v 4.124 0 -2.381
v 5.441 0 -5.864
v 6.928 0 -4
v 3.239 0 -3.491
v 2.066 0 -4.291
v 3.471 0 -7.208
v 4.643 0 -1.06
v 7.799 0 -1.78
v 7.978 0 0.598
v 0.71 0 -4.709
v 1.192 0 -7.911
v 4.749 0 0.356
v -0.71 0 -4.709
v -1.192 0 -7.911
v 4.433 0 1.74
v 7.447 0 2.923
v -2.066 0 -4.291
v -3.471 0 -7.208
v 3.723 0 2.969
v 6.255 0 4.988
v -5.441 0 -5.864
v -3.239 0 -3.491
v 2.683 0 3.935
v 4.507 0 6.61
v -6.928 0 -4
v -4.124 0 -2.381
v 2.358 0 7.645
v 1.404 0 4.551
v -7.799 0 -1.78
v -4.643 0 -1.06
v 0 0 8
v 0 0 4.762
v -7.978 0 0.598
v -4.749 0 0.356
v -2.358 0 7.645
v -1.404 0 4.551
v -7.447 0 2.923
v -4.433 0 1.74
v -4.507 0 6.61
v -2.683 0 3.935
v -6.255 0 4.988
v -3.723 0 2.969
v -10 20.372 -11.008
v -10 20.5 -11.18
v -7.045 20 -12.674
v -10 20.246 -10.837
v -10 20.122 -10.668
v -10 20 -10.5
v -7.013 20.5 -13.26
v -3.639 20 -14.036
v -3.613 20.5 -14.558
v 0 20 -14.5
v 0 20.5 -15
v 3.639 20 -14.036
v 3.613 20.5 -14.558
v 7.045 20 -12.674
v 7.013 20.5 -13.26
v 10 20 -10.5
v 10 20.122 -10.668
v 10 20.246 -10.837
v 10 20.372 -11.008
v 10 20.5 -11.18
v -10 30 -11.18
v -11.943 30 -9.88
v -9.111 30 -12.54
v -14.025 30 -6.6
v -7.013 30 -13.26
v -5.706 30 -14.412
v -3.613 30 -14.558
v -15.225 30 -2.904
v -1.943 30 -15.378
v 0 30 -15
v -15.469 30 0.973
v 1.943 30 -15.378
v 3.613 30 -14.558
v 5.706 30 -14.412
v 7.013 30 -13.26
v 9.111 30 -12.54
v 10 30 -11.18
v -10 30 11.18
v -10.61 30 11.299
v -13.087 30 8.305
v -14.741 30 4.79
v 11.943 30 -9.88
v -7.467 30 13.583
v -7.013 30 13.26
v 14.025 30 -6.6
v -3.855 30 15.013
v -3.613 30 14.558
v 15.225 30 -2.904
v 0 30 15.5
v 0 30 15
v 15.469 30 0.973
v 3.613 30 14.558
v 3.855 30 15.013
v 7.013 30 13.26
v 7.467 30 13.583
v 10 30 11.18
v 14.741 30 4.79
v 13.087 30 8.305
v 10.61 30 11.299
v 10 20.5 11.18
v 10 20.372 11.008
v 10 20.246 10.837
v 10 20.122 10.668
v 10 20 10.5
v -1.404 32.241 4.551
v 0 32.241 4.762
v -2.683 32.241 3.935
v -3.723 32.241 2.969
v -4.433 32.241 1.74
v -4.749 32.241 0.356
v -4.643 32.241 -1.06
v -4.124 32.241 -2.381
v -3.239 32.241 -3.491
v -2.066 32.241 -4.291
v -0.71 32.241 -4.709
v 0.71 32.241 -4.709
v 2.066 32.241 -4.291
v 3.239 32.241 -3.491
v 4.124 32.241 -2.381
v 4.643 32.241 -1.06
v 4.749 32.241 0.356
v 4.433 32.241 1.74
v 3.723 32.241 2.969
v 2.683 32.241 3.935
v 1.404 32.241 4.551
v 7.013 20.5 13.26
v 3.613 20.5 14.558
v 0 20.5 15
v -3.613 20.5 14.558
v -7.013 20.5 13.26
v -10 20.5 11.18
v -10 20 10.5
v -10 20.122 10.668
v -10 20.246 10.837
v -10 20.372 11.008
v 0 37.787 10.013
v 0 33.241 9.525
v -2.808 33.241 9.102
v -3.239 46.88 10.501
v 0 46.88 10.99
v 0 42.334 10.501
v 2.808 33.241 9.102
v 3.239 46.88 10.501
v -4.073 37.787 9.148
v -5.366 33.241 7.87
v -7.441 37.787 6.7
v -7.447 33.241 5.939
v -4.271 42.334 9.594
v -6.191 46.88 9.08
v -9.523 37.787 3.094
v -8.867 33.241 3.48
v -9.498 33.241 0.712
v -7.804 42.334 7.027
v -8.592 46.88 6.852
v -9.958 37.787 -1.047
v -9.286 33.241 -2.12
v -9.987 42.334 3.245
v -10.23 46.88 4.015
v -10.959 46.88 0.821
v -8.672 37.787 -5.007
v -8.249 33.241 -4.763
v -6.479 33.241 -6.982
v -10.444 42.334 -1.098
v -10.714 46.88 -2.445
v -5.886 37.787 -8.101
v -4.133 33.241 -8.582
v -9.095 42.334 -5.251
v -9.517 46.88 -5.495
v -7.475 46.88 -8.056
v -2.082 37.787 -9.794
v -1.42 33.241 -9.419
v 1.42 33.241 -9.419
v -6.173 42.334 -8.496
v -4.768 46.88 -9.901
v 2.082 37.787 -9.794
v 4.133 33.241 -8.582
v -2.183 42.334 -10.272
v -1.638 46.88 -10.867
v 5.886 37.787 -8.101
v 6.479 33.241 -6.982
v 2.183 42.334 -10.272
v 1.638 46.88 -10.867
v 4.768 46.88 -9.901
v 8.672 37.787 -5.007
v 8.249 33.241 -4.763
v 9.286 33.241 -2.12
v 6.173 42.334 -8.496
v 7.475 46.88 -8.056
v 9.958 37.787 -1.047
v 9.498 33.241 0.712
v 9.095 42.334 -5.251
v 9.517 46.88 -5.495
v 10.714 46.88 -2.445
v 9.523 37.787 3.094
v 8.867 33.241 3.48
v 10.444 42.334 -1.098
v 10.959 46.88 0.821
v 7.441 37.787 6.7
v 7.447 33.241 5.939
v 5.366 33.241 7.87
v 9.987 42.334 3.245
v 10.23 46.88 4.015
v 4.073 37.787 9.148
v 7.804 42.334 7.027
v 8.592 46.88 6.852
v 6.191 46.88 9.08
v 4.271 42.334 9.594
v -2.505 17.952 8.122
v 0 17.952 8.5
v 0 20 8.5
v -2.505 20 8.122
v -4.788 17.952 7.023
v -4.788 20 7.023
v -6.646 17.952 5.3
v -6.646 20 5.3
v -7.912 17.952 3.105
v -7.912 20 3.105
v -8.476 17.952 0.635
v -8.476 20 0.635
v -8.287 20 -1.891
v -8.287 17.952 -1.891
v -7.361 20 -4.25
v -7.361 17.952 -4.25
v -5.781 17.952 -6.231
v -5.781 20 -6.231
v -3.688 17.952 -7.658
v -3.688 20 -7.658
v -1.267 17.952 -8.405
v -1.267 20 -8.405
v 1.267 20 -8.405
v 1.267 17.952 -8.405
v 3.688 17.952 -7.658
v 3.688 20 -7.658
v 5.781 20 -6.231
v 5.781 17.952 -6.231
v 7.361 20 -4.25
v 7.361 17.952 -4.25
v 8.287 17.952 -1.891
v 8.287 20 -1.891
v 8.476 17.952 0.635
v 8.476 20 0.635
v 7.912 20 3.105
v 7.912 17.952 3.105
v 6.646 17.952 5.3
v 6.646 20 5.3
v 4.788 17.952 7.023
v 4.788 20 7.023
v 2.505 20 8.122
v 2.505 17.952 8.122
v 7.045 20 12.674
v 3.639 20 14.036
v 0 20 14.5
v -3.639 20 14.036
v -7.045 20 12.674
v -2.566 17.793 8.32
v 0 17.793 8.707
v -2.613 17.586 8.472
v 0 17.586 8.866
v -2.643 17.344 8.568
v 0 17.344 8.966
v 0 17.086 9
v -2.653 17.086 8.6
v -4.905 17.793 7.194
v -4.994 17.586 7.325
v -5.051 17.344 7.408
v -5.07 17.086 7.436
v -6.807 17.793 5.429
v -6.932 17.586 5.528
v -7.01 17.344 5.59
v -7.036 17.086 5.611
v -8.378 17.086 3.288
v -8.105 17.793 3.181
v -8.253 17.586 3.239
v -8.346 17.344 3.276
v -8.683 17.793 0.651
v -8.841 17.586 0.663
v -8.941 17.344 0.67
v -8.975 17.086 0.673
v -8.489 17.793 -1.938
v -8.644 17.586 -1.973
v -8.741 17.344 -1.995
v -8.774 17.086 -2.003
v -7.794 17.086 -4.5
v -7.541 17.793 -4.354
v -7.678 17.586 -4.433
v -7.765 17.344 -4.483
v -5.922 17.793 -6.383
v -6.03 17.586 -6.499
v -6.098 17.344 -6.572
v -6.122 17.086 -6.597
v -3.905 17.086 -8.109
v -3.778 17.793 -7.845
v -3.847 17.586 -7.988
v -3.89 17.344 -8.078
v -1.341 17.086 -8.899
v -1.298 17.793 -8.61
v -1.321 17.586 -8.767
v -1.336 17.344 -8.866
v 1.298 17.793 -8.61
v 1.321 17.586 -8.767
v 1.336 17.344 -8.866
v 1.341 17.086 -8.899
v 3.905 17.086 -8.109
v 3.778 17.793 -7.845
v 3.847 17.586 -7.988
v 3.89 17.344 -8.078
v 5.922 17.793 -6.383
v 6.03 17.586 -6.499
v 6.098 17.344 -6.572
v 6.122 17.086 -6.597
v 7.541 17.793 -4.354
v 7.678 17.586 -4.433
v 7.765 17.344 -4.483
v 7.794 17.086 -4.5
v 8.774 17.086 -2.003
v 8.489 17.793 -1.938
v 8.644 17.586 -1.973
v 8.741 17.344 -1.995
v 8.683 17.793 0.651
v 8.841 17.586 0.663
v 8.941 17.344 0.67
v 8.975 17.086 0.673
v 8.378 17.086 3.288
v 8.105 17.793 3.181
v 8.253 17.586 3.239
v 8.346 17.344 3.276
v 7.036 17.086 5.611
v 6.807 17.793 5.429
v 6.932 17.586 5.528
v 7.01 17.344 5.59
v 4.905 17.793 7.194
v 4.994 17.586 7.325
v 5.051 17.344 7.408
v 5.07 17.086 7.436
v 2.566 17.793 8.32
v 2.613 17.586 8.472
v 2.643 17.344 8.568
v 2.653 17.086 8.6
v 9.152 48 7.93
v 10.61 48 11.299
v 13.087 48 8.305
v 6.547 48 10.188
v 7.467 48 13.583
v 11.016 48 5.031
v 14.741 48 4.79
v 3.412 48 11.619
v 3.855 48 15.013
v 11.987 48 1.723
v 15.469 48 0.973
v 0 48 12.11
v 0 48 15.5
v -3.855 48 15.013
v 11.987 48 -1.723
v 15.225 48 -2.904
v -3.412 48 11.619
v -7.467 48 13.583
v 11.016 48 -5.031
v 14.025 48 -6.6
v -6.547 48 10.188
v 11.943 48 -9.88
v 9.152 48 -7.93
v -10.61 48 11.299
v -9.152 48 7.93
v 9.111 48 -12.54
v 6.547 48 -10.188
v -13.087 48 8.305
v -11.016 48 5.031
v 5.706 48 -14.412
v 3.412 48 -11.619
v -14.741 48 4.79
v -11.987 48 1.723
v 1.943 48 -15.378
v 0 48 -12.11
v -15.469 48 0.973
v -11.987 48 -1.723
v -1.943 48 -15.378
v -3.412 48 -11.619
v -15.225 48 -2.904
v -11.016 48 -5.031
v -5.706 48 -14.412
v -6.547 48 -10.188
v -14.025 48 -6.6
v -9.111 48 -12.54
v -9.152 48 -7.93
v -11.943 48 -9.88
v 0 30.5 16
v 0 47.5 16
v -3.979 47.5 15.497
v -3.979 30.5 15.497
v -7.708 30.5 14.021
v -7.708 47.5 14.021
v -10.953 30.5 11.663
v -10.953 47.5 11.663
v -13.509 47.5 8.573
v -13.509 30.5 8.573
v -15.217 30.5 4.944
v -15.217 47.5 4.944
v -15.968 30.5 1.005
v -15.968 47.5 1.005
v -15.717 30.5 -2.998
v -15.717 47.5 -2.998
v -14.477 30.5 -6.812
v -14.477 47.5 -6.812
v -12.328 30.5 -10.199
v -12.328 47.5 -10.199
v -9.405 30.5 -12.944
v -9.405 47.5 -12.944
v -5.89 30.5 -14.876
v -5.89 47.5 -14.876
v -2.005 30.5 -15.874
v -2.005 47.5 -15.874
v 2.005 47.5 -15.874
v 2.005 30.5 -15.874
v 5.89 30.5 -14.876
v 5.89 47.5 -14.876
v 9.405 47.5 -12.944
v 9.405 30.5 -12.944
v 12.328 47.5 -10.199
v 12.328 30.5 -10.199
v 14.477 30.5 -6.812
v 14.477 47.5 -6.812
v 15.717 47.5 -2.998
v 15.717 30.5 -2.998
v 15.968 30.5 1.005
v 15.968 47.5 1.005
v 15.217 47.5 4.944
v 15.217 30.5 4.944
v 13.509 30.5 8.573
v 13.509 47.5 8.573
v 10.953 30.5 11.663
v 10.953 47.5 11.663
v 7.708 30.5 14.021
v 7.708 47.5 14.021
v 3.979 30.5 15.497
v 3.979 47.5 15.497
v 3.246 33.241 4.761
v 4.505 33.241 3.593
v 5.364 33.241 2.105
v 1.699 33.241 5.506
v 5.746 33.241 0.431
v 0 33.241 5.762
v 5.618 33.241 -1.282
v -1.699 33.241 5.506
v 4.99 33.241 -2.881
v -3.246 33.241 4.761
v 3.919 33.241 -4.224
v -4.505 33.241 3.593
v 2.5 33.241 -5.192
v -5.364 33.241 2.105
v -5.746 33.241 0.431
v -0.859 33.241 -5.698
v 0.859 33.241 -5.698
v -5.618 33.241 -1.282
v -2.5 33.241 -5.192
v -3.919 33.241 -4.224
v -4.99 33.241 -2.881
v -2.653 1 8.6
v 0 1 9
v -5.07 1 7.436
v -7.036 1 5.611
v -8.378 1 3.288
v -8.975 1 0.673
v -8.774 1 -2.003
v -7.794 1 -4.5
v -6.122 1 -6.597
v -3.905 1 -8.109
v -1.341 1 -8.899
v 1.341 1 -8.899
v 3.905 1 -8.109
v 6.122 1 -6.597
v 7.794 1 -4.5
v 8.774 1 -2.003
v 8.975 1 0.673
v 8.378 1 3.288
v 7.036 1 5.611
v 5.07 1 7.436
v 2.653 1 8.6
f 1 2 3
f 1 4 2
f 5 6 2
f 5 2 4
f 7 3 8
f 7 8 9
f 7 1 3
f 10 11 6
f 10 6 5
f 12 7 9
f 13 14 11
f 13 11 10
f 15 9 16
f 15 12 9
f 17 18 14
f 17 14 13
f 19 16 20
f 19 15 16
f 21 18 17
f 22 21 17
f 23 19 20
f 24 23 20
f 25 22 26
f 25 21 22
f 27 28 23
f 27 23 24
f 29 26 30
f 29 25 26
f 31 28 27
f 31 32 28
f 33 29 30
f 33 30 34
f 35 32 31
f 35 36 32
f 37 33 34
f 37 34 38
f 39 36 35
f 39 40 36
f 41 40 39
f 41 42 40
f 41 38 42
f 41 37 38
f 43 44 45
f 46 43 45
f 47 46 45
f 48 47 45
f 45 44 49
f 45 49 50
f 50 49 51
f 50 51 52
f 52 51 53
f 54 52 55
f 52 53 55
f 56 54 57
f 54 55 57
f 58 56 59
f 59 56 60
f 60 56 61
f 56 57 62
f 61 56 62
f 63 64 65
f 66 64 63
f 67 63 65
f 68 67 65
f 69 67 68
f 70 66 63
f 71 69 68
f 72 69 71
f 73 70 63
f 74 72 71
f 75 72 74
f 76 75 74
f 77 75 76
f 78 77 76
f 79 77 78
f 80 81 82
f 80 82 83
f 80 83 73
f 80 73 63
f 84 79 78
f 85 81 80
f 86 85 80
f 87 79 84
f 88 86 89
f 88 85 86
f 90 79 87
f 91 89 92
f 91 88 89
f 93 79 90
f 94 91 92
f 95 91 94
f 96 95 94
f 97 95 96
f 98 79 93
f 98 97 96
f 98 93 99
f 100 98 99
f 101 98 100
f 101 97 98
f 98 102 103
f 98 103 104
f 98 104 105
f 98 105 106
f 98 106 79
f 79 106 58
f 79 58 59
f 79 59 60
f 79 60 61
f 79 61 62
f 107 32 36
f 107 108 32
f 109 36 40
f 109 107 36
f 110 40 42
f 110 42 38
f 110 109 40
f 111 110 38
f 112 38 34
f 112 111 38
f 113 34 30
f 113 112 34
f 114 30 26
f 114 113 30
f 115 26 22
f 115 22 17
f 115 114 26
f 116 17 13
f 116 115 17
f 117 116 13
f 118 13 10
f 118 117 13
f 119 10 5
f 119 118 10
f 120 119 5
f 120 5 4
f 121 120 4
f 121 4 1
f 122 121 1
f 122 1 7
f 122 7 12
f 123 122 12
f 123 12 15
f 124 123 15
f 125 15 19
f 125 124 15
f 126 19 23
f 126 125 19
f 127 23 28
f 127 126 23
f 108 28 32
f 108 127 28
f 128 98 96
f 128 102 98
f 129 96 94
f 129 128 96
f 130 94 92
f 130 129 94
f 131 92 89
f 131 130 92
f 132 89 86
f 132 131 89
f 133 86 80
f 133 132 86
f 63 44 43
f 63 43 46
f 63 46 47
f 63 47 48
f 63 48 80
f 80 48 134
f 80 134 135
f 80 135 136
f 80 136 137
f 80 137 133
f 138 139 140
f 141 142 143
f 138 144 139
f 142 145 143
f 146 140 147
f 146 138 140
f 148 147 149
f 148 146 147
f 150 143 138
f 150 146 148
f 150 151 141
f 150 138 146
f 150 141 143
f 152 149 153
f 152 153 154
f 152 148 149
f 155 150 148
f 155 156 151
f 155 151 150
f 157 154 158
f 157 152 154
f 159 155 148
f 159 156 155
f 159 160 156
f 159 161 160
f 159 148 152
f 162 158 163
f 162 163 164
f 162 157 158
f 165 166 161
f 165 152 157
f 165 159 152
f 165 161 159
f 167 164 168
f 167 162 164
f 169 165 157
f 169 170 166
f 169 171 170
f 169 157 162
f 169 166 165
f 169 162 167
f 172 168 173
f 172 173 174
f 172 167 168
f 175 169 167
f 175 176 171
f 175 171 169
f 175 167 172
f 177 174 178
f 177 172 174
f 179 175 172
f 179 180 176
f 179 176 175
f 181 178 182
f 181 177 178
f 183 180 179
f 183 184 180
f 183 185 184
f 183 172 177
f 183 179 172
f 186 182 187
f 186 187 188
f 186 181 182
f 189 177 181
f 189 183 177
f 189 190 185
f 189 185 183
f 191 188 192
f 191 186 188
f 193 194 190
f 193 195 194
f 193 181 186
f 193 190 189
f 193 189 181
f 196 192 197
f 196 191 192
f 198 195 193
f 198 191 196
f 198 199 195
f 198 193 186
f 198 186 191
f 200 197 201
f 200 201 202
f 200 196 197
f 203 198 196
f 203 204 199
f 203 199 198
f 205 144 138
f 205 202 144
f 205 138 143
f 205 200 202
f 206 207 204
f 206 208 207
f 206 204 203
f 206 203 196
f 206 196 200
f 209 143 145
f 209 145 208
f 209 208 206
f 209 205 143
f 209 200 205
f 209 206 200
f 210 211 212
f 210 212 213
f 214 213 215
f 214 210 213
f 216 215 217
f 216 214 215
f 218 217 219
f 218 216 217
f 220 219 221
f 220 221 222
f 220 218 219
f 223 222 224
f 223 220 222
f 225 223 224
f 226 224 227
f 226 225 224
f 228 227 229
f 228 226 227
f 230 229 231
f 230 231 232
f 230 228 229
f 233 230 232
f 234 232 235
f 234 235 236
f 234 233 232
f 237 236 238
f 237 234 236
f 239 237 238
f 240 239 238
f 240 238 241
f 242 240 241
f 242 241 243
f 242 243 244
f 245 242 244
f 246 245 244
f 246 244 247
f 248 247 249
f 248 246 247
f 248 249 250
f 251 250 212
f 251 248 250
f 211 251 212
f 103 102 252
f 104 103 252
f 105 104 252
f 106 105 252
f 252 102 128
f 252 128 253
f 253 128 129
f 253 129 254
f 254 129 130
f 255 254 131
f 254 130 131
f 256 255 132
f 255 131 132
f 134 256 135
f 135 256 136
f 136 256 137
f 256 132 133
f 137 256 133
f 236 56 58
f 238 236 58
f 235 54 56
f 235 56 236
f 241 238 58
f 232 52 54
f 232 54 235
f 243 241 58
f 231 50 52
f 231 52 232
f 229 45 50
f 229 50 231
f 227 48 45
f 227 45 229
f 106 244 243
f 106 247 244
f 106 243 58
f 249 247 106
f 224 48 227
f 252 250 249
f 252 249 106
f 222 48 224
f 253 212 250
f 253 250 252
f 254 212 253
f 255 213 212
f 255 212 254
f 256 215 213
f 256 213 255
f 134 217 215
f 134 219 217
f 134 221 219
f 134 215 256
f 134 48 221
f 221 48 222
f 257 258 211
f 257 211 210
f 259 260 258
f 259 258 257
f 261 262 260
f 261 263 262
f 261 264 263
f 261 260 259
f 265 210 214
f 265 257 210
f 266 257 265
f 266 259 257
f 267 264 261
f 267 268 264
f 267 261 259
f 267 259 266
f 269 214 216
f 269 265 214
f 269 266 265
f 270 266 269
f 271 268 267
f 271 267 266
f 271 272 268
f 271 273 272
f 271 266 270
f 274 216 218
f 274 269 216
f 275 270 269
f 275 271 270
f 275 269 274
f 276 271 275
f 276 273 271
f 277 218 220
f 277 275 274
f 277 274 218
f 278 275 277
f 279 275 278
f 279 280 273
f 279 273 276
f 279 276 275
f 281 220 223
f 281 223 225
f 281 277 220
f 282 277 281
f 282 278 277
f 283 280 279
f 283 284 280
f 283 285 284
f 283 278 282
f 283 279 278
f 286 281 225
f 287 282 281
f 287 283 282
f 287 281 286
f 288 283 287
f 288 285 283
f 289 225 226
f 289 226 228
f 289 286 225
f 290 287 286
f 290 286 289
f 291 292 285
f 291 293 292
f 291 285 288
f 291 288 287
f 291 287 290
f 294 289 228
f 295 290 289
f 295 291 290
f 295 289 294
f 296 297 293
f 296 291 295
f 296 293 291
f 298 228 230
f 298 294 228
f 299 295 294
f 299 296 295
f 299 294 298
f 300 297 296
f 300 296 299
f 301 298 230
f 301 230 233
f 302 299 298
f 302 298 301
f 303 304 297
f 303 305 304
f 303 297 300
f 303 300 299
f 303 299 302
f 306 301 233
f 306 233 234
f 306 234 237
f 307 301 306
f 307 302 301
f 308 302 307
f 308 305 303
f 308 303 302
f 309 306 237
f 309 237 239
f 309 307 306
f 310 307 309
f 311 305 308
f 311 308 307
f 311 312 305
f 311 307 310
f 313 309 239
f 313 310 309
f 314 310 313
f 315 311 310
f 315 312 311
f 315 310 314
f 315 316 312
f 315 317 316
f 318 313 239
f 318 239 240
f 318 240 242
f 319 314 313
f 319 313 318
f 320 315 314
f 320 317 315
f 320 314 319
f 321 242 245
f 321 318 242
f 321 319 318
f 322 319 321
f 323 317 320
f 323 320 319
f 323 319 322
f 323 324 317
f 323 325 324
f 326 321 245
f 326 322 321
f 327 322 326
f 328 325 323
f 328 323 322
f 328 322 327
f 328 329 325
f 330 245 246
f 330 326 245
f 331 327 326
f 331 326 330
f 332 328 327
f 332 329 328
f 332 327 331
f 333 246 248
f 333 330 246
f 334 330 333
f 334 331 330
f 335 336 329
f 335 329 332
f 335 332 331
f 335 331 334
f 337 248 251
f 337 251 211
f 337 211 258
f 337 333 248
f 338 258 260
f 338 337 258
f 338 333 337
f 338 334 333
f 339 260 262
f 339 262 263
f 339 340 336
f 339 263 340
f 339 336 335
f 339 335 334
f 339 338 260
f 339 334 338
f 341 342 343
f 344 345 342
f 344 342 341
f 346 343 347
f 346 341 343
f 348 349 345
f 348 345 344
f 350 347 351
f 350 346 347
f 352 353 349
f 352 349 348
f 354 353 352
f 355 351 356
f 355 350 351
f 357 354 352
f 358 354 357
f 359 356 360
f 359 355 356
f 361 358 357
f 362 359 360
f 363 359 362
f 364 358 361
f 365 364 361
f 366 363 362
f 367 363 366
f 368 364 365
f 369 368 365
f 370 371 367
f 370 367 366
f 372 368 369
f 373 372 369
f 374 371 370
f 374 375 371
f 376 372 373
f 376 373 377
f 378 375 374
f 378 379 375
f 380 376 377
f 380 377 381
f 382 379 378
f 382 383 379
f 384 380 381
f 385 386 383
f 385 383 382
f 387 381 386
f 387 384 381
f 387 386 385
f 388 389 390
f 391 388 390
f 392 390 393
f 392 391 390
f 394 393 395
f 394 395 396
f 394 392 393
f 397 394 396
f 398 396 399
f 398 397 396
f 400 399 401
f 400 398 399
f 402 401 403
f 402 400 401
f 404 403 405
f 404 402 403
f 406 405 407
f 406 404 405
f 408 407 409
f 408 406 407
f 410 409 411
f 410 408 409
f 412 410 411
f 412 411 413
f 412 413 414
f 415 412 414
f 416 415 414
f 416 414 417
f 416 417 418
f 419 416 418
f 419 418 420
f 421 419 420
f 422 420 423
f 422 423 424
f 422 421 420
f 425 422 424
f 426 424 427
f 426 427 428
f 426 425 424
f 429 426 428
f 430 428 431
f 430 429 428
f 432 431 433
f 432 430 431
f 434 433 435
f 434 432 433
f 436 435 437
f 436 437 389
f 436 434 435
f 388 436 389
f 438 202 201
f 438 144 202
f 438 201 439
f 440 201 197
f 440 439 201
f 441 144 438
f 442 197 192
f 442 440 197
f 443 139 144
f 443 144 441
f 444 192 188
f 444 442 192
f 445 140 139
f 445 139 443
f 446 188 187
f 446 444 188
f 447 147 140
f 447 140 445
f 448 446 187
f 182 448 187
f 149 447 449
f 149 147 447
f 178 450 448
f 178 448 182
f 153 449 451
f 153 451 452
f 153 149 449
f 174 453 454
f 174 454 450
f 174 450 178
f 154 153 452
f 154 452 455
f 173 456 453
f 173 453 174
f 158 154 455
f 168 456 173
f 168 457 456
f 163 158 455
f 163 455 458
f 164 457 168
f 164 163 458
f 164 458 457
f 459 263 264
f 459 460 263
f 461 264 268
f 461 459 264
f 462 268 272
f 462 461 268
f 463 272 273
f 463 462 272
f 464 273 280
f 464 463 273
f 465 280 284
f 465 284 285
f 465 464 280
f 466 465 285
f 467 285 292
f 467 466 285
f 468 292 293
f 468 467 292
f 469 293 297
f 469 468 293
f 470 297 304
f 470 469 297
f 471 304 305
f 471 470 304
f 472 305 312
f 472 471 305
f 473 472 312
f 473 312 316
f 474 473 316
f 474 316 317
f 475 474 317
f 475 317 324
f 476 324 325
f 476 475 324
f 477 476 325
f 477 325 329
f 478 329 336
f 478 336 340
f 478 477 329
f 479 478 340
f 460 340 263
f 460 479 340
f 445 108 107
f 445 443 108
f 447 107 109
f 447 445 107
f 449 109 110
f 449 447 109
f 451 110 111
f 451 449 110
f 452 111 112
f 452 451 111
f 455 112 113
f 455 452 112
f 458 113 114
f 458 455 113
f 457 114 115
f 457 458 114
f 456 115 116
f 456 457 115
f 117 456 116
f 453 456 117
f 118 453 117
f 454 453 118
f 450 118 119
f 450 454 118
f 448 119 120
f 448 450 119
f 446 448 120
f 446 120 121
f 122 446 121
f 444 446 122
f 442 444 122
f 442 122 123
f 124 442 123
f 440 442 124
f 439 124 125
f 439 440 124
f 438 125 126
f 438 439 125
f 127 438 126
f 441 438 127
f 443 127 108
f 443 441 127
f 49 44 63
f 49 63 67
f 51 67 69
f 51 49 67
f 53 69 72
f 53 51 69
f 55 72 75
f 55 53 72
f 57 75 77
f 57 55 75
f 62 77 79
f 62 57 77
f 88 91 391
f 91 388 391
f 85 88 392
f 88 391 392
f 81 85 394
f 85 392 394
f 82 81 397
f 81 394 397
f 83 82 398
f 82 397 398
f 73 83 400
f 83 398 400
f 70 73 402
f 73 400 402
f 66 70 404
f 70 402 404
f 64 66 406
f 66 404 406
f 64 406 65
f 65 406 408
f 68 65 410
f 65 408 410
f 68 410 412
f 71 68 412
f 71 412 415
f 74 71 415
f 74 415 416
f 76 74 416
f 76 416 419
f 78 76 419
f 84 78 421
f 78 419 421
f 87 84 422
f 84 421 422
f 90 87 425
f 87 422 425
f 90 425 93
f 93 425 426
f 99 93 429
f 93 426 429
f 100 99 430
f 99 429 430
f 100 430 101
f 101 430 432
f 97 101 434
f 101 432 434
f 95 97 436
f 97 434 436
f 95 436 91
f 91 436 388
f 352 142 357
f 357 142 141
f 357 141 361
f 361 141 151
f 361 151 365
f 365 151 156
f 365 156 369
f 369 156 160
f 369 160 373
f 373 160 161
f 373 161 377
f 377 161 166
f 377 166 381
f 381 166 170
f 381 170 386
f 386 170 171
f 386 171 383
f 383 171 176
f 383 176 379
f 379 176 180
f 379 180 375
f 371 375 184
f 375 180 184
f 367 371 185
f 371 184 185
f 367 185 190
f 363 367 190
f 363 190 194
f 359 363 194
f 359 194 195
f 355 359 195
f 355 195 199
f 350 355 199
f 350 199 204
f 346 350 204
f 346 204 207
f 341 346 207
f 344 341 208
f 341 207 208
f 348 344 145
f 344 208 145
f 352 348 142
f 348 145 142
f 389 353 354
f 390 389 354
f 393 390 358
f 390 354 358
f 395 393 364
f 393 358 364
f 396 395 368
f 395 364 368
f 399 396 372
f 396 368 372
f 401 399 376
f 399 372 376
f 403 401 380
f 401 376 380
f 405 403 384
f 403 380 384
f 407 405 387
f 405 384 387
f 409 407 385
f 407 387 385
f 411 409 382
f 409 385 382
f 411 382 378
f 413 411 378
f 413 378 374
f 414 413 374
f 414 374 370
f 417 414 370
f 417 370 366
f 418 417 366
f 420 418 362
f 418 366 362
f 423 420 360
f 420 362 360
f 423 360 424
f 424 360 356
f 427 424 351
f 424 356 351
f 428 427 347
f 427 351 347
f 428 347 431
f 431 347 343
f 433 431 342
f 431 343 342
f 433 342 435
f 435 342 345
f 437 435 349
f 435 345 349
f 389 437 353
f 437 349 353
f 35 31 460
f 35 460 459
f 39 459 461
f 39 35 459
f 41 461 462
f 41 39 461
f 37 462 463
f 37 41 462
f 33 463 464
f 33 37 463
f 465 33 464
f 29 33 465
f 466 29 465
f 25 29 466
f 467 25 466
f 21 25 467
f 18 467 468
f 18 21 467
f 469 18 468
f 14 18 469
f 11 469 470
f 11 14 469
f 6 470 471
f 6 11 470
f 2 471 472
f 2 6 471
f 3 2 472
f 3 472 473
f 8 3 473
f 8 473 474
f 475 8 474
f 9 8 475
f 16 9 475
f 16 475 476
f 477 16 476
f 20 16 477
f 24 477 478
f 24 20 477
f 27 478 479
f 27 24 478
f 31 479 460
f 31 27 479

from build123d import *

# Parameters (mm, degrees)
CHAFL_N1_SIZE         = 1
REDONDEO1_R           = 1
CHAFL_N2_SIZE         = 0.5
CROQUIS3_W            = 14.730869345
CROQUIS3_H            = 22.360679774
CORTAR_EXTRUIR1_DEPTH = 30
CHAFL_N3_SIZE         = 1
CHAFL_N3_SIZE2        = 1.12675647


with BuildPart() as part:
    # Croquis1 → Revolución1 (revolve)
    with BuildSketch(Plane.XY, mode=Mode.PRIVATE) as revoluci_n1_sk:
        Polygon((11.11, 48), (16, 48), (16, 30), (15, 30), (15, 20), (8.5, 20), (8.5, 17.951688966), (9, 17.951688966), (9, 0), (4.7625, 0), (4.7625, 32.24119236), (5.7625, 33.24119236), (9.525, 33.24119236), align=None)
    revolve(revoluci_n1_sk.sketch.rotate(Axis((0, 50.374990084, 0), (0, -1, 0)), 90), axis=Axis((0, 50.374990084, 0), (0, -1, 0)))

    # Chaflán1
    chafl_n1_edges = [part.edges().sort_by_distance(p)[0] for p in [
        (0, 0, -9),
    ]]
    chamfer(chafl_n1_edges, length=CHAFL_N1_SIZE)

    # Redondeo1
    # the kernel refuses this fillet: 1 mm, written as the material it takes off along each edge
    with BuildSketch(Plane(origin=(0, 17.951688966, 0), x_dir=(0, 0, 1), z_dir=(1, 0, 0))) as redondeo1_piece_1:
        with BuildLine():
            CenterArc((8, 0.866025404), REDONDEO1_R, 300, 60)
            Line((8.5, 0), (8.51, -0.017320508))
            ThreePointArc((8.51, -0.017320508), (8.75, -0.02), (9, -0.02))
            Line((9, -0.02), (9.02, 0))
            Line((9.02, 0), (9.02, 0.866025404))
            Line((9.02, 0.866025404), (9, 0.866025404))
        make_face()
    revolve(axis=Axis((0, 17.951688966, 0), (0, -1, 0)), mode=Mode.SUBTRACT)

    # Chaflán2
    chafl_n2_edges = [part.edges().sort_by_distance(p)[0] for p in [
        (0, 20, -15),
        (0, 30, -16),
        (0, 48, -16),
    ]]
    chamfer(chafl_n2_edges, length=CHAFL_N2_SIZE)

    # Croquis3 → Cortar-Extruir1 (cut)
    with BuildSketch(Plane.XZ):
        Polygon((10, 11.180339887), (10, -11.180339887), (24.245950338, -11.180339887), (24.827853146, 11.180339887), align=None)
        with Locations((-17.365434673, 0)):
            Rectangle(CROQUIS3_W, CROQUIS3_H)
    extrude(amount=-CORTAR_EXTRUIR1_DEPTH, mode=Mode.SUBTRACT)

    # Chaflán3
    chafl_n3_edges = [part.edges().sort_by_distance(p)[0] for p in [
        (0, 48, -11.11),
    ]]
    chafl_n3_side = [part.faces().sort_by_distance(p)[0] for p in [
        (0, 48, -15.061593796),
    ]]
    chamfer(chafl_n3_edges, length=CHAFL_N3_SIZE, length2=CHAFL_N3_SIZE2, reference=chafl_n3_side[0])


solid = part.part
